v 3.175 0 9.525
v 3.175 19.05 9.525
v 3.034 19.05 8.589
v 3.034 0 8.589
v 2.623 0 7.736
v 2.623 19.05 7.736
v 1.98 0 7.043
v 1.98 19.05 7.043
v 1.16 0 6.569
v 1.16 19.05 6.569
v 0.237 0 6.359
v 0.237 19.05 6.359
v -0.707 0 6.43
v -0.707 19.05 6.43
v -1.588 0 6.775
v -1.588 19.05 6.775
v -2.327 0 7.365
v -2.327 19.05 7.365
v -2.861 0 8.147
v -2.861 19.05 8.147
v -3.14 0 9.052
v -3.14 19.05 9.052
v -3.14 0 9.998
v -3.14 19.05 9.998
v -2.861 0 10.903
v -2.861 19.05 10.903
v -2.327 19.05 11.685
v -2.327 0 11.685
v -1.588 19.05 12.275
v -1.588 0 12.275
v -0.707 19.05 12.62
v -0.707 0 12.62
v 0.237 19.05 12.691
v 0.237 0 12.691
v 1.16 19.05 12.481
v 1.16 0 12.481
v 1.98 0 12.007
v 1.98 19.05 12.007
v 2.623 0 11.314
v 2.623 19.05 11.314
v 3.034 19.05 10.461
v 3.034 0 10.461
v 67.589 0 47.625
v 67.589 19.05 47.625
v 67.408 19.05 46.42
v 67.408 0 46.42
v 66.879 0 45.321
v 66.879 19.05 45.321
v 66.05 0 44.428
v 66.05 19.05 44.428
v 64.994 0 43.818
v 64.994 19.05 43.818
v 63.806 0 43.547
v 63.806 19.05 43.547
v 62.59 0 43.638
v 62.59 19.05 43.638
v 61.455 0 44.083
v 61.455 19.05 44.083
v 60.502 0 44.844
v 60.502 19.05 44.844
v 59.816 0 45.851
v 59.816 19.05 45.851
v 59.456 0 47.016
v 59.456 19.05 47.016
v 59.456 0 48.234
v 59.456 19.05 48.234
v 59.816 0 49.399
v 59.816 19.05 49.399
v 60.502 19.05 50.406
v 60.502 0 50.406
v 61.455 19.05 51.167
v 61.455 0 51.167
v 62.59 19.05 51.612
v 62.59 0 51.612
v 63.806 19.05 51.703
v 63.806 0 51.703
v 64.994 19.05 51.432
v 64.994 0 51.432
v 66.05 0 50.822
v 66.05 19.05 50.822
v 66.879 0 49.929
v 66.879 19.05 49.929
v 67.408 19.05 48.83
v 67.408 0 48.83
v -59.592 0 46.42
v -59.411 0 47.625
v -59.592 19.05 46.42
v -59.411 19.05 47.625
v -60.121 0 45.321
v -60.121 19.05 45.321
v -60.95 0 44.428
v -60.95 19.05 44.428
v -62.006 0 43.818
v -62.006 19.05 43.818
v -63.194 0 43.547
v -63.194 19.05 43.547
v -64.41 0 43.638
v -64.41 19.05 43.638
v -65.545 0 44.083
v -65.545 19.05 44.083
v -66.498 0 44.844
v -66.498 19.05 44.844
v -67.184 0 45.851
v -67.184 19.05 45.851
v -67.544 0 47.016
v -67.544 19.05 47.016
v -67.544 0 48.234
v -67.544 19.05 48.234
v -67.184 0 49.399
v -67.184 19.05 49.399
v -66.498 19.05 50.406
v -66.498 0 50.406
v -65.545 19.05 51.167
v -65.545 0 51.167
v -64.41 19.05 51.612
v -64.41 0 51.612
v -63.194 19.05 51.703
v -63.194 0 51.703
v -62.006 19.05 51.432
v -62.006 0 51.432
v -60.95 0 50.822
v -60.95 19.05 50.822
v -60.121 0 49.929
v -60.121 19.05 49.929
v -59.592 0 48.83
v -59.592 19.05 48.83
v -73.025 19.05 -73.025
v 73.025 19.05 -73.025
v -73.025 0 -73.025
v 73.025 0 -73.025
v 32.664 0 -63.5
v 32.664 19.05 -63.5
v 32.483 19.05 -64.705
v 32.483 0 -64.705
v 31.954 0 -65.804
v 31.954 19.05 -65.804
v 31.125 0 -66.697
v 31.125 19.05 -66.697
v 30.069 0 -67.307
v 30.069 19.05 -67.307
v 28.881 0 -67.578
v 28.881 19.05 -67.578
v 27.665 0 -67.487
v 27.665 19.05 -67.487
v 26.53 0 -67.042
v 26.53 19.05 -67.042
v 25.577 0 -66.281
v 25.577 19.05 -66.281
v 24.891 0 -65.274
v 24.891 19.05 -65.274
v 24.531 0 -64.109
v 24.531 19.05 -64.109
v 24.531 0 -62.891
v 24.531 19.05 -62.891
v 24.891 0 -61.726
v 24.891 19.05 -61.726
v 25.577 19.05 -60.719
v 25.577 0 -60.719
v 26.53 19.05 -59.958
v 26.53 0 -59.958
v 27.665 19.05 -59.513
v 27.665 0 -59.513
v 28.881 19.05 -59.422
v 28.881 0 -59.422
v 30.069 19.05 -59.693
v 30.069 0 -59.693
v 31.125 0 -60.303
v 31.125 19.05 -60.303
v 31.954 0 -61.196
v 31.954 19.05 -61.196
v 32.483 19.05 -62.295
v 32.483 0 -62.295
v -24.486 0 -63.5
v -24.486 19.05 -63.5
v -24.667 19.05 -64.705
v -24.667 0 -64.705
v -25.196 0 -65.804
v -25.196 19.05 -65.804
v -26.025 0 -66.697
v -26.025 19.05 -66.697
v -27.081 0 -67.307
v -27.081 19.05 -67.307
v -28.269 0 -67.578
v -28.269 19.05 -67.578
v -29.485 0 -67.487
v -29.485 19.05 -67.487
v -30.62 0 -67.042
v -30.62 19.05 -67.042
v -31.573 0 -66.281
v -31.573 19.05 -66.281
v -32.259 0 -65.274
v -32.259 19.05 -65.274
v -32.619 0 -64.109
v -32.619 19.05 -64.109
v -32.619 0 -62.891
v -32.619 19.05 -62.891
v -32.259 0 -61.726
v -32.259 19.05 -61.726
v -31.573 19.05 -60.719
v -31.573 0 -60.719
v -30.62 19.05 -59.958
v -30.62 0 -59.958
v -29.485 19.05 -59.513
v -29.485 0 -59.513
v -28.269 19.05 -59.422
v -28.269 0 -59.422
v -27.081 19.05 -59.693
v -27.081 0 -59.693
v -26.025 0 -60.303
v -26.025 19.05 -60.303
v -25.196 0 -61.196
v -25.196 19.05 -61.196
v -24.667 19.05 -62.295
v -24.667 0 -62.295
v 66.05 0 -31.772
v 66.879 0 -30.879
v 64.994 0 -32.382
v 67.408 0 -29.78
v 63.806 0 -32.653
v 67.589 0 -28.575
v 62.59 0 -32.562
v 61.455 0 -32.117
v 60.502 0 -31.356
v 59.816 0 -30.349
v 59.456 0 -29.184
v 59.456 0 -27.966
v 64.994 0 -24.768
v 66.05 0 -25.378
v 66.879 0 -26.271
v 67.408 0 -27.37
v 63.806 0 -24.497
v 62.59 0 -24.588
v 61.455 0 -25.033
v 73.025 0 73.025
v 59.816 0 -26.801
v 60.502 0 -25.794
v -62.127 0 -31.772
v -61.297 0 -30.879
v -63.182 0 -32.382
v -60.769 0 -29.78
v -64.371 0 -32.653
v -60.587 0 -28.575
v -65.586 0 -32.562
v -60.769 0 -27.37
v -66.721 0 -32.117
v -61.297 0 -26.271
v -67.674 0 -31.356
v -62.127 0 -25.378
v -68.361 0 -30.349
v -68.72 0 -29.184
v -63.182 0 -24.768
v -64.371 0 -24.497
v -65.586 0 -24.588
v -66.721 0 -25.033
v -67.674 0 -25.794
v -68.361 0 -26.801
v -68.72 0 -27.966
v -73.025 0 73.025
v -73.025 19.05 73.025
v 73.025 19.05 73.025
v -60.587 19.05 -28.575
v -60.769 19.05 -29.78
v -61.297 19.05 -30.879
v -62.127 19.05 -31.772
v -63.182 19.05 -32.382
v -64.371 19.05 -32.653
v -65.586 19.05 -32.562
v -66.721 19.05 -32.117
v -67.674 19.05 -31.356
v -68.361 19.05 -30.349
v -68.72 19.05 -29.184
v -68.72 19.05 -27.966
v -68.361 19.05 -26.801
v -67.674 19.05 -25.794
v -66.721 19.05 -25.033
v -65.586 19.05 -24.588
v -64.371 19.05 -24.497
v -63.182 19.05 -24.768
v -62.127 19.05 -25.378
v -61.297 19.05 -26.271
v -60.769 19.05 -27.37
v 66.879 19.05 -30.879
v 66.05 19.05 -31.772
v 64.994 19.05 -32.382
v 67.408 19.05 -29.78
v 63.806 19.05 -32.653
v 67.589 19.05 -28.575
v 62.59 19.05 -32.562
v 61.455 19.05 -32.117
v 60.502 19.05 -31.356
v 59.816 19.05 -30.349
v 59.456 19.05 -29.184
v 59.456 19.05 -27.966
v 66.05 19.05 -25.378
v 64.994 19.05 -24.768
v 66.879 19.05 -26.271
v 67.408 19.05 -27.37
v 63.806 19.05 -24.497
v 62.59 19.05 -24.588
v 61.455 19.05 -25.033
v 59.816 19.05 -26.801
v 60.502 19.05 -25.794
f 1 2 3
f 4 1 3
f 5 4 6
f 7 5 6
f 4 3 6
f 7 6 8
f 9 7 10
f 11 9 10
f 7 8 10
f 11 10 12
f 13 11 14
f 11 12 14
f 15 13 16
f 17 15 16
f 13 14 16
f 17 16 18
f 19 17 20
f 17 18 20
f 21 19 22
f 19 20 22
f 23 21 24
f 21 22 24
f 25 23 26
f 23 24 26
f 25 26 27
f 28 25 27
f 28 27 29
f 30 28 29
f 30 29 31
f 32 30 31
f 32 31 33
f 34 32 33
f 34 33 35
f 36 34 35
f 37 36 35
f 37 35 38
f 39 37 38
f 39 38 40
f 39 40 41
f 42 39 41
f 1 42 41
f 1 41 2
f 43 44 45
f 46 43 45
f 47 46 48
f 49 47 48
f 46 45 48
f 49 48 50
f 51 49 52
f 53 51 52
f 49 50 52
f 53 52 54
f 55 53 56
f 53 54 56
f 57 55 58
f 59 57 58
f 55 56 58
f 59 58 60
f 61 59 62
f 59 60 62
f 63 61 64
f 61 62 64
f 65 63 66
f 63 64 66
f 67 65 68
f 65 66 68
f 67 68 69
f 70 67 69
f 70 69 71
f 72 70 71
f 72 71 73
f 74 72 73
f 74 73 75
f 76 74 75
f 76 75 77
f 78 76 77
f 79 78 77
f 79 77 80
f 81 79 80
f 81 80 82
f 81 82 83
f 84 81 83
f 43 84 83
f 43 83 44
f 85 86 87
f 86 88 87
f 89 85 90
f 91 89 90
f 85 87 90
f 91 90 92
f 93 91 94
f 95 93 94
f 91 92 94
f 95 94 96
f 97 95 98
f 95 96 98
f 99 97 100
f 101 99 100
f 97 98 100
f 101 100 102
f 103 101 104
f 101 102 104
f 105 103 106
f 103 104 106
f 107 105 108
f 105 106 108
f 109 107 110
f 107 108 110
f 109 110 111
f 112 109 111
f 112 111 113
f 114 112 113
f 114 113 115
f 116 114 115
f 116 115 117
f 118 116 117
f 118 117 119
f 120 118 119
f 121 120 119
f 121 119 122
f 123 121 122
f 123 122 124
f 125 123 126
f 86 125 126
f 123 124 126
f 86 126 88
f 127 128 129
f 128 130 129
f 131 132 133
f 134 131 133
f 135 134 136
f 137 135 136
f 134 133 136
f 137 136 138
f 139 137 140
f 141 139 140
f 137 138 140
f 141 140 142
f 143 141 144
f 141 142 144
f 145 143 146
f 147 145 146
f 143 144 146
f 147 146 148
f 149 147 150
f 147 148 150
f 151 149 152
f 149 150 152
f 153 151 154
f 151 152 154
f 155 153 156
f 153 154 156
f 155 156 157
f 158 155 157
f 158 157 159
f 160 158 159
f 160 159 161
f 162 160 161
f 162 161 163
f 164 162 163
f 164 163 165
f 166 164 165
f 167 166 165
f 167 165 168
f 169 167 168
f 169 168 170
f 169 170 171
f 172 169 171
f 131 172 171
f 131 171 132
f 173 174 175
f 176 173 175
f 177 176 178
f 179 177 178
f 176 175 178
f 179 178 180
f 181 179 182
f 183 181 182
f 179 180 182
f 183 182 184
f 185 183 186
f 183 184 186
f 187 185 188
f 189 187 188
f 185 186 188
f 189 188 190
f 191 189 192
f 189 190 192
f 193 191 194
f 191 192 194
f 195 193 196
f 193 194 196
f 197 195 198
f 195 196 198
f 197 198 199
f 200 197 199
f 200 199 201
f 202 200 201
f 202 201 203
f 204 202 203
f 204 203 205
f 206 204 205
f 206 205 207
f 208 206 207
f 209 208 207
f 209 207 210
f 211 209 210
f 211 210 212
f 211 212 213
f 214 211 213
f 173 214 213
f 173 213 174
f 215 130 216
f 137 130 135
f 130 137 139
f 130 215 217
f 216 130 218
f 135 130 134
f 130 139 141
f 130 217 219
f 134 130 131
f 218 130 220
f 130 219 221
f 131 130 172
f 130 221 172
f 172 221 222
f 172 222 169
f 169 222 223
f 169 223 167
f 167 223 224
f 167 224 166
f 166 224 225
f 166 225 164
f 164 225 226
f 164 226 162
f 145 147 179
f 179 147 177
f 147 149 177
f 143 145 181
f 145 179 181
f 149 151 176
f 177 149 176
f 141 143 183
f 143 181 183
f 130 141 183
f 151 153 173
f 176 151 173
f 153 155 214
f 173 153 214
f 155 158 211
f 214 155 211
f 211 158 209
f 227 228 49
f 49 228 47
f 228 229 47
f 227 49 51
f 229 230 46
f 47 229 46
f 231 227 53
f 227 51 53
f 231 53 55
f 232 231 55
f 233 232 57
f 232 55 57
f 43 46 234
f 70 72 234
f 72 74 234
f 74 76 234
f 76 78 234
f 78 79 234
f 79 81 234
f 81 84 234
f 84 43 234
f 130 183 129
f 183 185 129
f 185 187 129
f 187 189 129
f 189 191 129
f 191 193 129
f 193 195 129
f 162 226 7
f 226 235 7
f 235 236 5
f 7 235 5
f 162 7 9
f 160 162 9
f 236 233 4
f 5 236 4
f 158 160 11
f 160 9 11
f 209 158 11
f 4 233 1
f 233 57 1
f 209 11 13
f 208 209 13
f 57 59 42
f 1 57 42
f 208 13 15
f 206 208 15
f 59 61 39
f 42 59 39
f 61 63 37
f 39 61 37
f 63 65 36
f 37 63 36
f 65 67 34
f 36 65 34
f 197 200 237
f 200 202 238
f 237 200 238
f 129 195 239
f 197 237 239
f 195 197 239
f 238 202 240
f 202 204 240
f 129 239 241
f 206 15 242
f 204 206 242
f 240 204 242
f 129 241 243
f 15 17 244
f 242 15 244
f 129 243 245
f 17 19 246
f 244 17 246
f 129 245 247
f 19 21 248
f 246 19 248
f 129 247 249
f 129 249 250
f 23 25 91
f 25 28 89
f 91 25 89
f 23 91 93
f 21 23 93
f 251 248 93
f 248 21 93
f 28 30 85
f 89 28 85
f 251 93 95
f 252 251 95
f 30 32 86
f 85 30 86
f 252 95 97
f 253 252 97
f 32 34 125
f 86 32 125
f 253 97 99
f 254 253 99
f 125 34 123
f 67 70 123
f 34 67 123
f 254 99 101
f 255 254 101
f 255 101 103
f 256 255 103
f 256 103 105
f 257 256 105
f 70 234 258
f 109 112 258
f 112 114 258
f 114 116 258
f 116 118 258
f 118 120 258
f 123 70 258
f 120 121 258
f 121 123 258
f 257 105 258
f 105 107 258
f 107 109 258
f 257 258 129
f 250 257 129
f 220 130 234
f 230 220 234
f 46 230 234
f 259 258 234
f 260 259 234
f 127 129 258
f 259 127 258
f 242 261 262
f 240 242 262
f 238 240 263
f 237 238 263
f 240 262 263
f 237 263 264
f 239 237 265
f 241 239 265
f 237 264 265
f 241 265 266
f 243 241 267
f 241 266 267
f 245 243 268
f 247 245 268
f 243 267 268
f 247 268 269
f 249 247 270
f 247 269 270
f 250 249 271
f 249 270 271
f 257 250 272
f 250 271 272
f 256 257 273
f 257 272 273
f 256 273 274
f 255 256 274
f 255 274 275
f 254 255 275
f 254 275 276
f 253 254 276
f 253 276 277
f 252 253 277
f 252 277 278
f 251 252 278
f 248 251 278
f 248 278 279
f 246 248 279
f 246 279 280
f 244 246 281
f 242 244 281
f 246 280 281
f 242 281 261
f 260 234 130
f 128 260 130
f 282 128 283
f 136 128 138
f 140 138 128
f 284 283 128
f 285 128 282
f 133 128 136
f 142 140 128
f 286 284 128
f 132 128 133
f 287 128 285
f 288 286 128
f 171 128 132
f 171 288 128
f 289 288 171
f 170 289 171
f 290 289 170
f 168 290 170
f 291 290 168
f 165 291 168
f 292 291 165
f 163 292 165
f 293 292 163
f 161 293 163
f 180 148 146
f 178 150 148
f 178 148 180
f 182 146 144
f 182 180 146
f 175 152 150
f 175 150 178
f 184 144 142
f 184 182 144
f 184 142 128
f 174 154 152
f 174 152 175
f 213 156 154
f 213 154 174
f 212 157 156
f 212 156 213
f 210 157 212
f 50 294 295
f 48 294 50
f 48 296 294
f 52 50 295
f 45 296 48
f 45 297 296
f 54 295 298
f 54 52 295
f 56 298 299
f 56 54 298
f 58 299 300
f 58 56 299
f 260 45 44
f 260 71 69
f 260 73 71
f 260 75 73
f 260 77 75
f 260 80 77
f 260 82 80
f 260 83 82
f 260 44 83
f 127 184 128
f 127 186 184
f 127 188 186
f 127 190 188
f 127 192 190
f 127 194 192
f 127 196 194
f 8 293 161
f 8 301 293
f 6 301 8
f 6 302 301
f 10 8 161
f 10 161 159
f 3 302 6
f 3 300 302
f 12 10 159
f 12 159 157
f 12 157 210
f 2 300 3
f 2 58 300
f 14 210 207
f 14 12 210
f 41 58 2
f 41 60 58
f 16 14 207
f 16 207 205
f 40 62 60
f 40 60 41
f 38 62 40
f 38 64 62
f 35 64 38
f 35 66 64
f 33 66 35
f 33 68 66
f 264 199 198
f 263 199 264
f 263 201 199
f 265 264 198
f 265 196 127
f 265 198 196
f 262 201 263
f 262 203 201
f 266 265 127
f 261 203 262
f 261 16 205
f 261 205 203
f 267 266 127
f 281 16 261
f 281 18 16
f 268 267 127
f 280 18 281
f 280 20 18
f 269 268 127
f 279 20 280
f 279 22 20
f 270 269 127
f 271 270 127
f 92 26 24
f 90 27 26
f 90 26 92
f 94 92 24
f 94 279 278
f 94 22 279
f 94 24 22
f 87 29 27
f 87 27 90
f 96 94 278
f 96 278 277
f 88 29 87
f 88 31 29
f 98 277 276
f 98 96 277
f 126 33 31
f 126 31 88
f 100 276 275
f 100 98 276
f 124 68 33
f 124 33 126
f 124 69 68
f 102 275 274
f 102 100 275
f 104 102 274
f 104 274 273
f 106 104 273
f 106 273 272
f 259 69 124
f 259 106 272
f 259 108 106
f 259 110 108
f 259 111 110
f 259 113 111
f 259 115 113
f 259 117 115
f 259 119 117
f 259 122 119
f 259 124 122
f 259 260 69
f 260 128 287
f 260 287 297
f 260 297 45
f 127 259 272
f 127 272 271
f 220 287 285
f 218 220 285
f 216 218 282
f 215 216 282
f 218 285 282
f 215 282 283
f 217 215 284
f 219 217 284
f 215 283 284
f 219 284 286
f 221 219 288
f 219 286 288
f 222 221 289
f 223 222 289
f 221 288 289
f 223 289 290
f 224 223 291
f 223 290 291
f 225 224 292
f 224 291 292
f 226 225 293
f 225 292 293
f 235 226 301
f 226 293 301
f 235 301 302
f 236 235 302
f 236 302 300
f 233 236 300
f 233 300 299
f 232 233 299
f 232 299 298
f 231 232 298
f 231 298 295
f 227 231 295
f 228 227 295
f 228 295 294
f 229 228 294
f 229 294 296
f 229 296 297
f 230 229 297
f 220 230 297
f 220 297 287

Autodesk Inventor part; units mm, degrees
ref_plane "YZ Plane" through (0, 0, 0) normal (1, 0, 0) x (0, 1, 0)
ref_plane "XZ Plane" through (0, 0, 0) normal (0, 1, 0) x (-1, 0, 0)
ref_plane "XY Plane" through (0, 0, 0) normal (0, 0, 1) x (1, 0, 0)
sketch "Sketch1" plane through (0, 0, 0) normal (0, 1, 0) x (-1, 0, 0)
  line L0 (73.025, 73.025) -> (-73.025, 73.025)
  line L1 (-73.025, 73.025) -> (-73.025, -73.025)
  line L2 (-73.025, -73.025) -> (73.025, -73.025)
  line L3 (73.025, -73.025) -> (73.025, 73.025)
  line L4 (73.025, 73.025) -> (-73.025, -73.025) construction
  line L5 (-73.025, 73.025) -> (73.025, -73.025) construction
  point P0 (0, 0)
  dimension "d2" = 146.05
  dimension "d3" = 146.05
extrude "Extrusion1" add sketch "Sketch1" along normal blind 19.05
sketch "Sketch2" plane through (0, 19.05, 0) normal (0, 1, 0) x (1, 0, 0)
  circle A0 centre (0, -9.525) radius 3.175
  line L0 (73.025, 73.025) -> (-73.025, 73.025) projected
  line L1 (-73.025, 73.025) -> (-73.025, -73.025) projected
  point P0 (0, 0)
  dimension "d6" = 6.35
  dimension "d7" = 82.55
  dimension "d8" = 73.025
extrude "Extrusion2" cut sketch "Sketch2" against normal blind 19.05
sketch "Sketch3" plane through (0, 19.05, 0) normal (0, 1, 0) x (1, 0, 0)
  circle A0 centre (-63.5, -47.625) radius 4.0894
  line L0 (-73.025, 73.025) -> (-73.025, -73.025) projected
  line L1 (-73.025, -73.025) -> (73.025, -73.025) projected
  circle A1 centre (-64.6763, 28.575) radius 4.0894
  circle A2 centre (63.5, -47.625) radius 4.0894
  line L2 (73.025, -73.025) -> (73.025, 73.025) projected
  circle A3 centre (63.5, 28.575) radius 4.0894
  circle A4 centre (-28.575, 63.5) radius 4.0894
  line L3 (73.025, 73.025) -> (-73.025, 73.025) projected
  circle A5 centre (28.575, 63.5) radius 4.0894
  point P0 (0, 0)
  dimension "d11" = 8.1788
  dimension "d12" = 9.525
  dimension "d13" = 25.4
  dimension "d14" = 8.1788
  dimension "d15" = 101.6
  dimension "d16" = 8.1788
  dimension "d17" = 25.4
  dimension "d18" = 9.525
  dimension "d19" = 8.1788
  dimension "d20" = 9.525
  dimension "d21" = 101.6
  dimension "d22" = 8.1788
  dimension "d23" = 44.45
  dimension "d24" = 9.525
  dimension "d25" = 8.1788
  dimension "d26" = 101.6
extrude "Extrusion3" cut sketch "Sketch3" against normal blind 19.05 contours A0 | A1 | A2 | A3 | A4 | A5
properties part number "Part_side"
